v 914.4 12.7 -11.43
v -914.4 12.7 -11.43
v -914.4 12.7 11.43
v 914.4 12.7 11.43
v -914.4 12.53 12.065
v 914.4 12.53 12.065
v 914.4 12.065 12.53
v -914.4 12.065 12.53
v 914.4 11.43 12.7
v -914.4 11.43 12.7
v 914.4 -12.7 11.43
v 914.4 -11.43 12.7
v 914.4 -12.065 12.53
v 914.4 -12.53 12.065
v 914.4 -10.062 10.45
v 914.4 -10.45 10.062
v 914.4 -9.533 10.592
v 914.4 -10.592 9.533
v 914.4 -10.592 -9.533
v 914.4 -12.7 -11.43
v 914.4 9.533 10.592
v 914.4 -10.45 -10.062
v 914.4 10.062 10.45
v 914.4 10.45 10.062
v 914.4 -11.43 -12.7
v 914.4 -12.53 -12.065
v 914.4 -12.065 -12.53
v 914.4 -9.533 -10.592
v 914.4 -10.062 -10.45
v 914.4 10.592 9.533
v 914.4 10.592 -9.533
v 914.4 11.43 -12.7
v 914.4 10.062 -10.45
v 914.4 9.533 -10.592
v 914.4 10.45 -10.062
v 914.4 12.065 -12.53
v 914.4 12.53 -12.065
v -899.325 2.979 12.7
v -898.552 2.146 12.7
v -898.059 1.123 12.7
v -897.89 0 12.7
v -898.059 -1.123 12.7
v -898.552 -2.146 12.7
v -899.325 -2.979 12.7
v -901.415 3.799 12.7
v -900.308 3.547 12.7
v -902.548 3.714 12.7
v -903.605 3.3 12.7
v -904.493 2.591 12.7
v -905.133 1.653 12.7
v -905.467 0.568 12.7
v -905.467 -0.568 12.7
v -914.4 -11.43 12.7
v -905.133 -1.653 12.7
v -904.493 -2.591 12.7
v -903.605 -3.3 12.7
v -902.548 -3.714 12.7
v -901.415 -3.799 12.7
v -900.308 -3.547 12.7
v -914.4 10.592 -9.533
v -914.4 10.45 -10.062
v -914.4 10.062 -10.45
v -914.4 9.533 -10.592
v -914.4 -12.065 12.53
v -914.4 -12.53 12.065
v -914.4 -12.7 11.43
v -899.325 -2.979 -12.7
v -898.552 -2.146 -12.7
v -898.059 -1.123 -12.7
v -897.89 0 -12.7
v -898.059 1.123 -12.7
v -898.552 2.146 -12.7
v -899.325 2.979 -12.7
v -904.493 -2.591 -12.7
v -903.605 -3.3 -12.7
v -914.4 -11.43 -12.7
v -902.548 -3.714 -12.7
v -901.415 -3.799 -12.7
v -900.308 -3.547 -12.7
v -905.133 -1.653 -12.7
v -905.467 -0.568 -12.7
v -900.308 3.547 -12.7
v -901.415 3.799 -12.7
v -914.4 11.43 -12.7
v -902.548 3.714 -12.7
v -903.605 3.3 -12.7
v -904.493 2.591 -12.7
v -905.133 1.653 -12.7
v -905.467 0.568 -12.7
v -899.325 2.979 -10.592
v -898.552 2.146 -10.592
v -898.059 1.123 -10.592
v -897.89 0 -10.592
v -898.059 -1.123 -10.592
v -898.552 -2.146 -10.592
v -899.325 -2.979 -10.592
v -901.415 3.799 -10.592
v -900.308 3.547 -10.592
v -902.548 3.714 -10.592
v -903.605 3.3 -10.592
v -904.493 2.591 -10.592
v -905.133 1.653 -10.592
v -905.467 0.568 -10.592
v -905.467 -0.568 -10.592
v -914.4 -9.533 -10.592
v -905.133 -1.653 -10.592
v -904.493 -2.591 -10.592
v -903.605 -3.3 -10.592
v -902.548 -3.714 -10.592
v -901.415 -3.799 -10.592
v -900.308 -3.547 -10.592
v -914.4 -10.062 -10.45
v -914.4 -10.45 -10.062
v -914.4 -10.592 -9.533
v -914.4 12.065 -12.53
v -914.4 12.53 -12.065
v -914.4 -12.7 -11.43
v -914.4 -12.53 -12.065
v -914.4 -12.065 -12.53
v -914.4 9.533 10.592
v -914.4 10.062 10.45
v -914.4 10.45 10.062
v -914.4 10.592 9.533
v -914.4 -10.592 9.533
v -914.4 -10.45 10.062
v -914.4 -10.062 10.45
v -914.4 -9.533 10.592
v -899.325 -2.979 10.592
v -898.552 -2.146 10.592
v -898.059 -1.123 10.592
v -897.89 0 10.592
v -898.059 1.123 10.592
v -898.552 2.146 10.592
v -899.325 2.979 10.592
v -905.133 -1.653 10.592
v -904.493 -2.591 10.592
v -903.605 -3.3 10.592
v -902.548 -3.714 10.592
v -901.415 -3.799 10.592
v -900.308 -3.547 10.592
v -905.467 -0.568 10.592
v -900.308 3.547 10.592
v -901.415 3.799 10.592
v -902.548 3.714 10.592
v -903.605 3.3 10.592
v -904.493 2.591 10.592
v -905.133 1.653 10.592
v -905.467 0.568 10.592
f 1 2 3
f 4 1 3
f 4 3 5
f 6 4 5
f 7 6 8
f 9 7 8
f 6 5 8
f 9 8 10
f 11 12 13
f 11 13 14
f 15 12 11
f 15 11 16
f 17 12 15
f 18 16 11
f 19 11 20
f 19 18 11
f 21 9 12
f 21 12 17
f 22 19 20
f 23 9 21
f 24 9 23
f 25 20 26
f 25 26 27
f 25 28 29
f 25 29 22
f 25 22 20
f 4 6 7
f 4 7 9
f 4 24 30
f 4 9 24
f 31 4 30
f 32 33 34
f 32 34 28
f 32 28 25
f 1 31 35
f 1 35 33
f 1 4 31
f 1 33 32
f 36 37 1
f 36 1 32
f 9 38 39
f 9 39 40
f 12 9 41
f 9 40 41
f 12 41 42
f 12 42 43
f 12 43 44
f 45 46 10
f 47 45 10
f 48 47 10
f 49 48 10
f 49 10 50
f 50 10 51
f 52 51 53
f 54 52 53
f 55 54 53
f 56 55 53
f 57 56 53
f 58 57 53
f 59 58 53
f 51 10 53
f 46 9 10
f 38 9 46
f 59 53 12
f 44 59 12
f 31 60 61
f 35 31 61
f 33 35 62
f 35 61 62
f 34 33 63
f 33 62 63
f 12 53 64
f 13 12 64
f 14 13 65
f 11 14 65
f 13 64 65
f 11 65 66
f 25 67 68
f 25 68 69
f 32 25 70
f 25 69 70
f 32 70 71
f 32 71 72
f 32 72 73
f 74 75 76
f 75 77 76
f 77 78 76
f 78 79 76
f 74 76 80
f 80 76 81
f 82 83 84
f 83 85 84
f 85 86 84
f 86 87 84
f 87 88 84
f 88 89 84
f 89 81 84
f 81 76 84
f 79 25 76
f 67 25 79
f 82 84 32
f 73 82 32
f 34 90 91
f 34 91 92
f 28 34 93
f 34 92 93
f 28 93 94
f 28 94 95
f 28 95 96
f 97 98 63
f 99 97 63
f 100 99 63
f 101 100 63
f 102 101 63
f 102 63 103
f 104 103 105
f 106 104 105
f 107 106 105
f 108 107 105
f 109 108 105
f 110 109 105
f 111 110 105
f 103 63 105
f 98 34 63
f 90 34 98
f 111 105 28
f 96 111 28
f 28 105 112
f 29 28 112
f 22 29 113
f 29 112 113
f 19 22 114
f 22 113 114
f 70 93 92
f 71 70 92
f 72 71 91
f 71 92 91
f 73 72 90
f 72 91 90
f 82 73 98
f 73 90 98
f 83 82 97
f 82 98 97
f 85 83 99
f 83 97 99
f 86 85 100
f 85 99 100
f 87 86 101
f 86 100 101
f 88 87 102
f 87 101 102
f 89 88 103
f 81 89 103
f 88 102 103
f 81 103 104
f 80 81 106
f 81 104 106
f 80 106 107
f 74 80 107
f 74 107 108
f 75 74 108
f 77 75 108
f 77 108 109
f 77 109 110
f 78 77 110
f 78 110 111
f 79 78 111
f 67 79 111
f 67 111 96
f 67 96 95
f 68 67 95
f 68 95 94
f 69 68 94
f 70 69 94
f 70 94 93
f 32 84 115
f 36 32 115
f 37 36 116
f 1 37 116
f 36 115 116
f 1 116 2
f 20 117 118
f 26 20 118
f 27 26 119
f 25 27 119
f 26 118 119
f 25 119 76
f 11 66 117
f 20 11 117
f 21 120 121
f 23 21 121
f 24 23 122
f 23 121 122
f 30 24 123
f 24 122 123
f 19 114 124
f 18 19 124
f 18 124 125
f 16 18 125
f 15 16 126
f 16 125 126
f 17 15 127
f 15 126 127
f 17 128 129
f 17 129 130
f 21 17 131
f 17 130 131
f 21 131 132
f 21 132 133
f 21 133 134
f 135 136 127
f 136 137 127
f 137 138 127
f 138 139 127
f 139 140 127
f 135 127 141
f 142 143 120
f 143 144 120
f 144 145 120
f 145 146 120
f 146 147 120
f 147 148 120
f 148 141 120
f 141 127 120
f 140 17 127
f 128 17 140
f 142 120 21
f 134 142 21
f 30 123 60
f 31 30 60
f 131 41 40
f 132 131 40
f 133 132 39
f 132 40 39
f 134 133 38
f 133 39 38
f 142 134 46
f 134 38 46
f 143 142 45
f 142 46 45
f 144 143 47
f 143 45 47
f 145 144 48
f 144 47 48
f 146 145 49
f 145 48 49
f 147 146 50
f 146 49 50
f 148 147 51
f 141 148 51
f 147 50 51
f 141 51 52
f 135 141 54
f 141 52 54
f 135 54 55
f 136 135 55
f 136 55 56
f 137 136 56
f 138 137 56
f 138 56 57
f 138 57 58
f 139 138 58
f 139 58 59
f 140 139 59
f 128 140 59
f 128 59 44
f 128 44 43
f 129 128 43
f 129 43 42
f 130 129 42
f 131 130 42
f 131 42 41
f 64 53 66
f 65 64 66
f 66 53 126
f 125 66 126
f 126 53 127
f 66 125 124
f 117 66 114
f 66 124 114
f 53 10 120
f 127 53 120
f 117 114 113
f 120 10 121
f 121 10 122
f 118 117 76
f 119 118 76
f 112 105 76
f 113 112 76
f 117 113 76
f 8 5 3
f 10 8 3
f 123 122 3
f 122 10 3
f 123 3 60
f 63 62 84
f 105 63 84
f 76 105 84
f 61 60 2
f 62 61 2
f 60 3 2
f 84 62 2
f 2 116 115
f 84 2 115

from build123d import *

# Parameters (mm, degrees)
BOSS_EXTRUDE1_DEPTH      = 914.4
BOSS_EXTRUDE1_DEPTH_BACK = 914.4
SKETCH5_R                = 3.81
CUT_EXTRUDE1_DEPTH       = 915.840865943


with BuildPart() as part:
    # Sketch4 → Boss-Extrude1 (new, two sides: drawn at the far end of the back side and taken through both)
    with BuildSketch(Plane(origin=(0, 0, 0), x_dir=(0, 0, -1), z_dir=(1, 0, 0)).offset(-BOSS_EXTRUDE1_DEPTH_BACK)):
        with BuildLine():
            Line((12.7, -11.43), (12.7, 11.43))
            ThreePointArc((12.7, 11.43), (12.328025612, 12.328025612), (11.43, 12.7))
            Line((11.43, 12.7), (-11.43, 12.7))
            ThreePointArc((-11.43, 12.7), (-12.328025612, 12.328025612), (-12.7, 11.43))
            Line((-12.7, 11.43), (-12.7, -11.43))
            ThreePointArc((-12.7, -11.43), (-12.328025612, -12.328025612), (-11.43, -12.7))
            Line((-11.43, -12.7), (11.43, -12.7))
            ThreePointArc((11.43, -12.7), (12.328025612, -12.328025612), (12.7, -11.43))
        make_face()
        with BuildLine():
            Line((10.5918, 9.53262), (10.5918, -9.53262))
            ThreePointArc((10.5918, -9.53262), (10.28157336, -10.28157336), (9.53262, -10.5918))
            Line((9.53262, -10.5918), (-9.53262, -10.5918))
            ThreePointArc((-9.53262, -10.5918), (-10.28157336, -10.28157336), (-10.5918, -9.53262))
            Line((-10.5918, -9.53262), (-10.5918, 9.53262))
            ThreePointArc((-10.5918, 9.53262), (-10.28157336, 10.28157336), (-9.53262, 10.5918))
            Line((-9.53262, 10.5918), (9.53262, 10.5918))
            ThreePointArc((9.53262, 10.5918), (10.28157336, 10.28157336), (10.5918, 9.53262))
        make_face(mode=Mode.SUBTRACT)
    extrude(amount=BOSS_EXTRUDE1_DEPTH + BOSS_EXTRUDE1_DEPTH_BACK)

    # Sketch5 → Cut-Extrude1 (cut, through all)
    with BuildSketch(Plane.XY.offset(12.7)):
        with Locations((-901.7, 0)):
            Circle(SKETCH5_R)
    extrude(amount=-CUT_EXTRUDE1_DEPTH, mode=Mode.SUBTRACT)


solid = part.part
